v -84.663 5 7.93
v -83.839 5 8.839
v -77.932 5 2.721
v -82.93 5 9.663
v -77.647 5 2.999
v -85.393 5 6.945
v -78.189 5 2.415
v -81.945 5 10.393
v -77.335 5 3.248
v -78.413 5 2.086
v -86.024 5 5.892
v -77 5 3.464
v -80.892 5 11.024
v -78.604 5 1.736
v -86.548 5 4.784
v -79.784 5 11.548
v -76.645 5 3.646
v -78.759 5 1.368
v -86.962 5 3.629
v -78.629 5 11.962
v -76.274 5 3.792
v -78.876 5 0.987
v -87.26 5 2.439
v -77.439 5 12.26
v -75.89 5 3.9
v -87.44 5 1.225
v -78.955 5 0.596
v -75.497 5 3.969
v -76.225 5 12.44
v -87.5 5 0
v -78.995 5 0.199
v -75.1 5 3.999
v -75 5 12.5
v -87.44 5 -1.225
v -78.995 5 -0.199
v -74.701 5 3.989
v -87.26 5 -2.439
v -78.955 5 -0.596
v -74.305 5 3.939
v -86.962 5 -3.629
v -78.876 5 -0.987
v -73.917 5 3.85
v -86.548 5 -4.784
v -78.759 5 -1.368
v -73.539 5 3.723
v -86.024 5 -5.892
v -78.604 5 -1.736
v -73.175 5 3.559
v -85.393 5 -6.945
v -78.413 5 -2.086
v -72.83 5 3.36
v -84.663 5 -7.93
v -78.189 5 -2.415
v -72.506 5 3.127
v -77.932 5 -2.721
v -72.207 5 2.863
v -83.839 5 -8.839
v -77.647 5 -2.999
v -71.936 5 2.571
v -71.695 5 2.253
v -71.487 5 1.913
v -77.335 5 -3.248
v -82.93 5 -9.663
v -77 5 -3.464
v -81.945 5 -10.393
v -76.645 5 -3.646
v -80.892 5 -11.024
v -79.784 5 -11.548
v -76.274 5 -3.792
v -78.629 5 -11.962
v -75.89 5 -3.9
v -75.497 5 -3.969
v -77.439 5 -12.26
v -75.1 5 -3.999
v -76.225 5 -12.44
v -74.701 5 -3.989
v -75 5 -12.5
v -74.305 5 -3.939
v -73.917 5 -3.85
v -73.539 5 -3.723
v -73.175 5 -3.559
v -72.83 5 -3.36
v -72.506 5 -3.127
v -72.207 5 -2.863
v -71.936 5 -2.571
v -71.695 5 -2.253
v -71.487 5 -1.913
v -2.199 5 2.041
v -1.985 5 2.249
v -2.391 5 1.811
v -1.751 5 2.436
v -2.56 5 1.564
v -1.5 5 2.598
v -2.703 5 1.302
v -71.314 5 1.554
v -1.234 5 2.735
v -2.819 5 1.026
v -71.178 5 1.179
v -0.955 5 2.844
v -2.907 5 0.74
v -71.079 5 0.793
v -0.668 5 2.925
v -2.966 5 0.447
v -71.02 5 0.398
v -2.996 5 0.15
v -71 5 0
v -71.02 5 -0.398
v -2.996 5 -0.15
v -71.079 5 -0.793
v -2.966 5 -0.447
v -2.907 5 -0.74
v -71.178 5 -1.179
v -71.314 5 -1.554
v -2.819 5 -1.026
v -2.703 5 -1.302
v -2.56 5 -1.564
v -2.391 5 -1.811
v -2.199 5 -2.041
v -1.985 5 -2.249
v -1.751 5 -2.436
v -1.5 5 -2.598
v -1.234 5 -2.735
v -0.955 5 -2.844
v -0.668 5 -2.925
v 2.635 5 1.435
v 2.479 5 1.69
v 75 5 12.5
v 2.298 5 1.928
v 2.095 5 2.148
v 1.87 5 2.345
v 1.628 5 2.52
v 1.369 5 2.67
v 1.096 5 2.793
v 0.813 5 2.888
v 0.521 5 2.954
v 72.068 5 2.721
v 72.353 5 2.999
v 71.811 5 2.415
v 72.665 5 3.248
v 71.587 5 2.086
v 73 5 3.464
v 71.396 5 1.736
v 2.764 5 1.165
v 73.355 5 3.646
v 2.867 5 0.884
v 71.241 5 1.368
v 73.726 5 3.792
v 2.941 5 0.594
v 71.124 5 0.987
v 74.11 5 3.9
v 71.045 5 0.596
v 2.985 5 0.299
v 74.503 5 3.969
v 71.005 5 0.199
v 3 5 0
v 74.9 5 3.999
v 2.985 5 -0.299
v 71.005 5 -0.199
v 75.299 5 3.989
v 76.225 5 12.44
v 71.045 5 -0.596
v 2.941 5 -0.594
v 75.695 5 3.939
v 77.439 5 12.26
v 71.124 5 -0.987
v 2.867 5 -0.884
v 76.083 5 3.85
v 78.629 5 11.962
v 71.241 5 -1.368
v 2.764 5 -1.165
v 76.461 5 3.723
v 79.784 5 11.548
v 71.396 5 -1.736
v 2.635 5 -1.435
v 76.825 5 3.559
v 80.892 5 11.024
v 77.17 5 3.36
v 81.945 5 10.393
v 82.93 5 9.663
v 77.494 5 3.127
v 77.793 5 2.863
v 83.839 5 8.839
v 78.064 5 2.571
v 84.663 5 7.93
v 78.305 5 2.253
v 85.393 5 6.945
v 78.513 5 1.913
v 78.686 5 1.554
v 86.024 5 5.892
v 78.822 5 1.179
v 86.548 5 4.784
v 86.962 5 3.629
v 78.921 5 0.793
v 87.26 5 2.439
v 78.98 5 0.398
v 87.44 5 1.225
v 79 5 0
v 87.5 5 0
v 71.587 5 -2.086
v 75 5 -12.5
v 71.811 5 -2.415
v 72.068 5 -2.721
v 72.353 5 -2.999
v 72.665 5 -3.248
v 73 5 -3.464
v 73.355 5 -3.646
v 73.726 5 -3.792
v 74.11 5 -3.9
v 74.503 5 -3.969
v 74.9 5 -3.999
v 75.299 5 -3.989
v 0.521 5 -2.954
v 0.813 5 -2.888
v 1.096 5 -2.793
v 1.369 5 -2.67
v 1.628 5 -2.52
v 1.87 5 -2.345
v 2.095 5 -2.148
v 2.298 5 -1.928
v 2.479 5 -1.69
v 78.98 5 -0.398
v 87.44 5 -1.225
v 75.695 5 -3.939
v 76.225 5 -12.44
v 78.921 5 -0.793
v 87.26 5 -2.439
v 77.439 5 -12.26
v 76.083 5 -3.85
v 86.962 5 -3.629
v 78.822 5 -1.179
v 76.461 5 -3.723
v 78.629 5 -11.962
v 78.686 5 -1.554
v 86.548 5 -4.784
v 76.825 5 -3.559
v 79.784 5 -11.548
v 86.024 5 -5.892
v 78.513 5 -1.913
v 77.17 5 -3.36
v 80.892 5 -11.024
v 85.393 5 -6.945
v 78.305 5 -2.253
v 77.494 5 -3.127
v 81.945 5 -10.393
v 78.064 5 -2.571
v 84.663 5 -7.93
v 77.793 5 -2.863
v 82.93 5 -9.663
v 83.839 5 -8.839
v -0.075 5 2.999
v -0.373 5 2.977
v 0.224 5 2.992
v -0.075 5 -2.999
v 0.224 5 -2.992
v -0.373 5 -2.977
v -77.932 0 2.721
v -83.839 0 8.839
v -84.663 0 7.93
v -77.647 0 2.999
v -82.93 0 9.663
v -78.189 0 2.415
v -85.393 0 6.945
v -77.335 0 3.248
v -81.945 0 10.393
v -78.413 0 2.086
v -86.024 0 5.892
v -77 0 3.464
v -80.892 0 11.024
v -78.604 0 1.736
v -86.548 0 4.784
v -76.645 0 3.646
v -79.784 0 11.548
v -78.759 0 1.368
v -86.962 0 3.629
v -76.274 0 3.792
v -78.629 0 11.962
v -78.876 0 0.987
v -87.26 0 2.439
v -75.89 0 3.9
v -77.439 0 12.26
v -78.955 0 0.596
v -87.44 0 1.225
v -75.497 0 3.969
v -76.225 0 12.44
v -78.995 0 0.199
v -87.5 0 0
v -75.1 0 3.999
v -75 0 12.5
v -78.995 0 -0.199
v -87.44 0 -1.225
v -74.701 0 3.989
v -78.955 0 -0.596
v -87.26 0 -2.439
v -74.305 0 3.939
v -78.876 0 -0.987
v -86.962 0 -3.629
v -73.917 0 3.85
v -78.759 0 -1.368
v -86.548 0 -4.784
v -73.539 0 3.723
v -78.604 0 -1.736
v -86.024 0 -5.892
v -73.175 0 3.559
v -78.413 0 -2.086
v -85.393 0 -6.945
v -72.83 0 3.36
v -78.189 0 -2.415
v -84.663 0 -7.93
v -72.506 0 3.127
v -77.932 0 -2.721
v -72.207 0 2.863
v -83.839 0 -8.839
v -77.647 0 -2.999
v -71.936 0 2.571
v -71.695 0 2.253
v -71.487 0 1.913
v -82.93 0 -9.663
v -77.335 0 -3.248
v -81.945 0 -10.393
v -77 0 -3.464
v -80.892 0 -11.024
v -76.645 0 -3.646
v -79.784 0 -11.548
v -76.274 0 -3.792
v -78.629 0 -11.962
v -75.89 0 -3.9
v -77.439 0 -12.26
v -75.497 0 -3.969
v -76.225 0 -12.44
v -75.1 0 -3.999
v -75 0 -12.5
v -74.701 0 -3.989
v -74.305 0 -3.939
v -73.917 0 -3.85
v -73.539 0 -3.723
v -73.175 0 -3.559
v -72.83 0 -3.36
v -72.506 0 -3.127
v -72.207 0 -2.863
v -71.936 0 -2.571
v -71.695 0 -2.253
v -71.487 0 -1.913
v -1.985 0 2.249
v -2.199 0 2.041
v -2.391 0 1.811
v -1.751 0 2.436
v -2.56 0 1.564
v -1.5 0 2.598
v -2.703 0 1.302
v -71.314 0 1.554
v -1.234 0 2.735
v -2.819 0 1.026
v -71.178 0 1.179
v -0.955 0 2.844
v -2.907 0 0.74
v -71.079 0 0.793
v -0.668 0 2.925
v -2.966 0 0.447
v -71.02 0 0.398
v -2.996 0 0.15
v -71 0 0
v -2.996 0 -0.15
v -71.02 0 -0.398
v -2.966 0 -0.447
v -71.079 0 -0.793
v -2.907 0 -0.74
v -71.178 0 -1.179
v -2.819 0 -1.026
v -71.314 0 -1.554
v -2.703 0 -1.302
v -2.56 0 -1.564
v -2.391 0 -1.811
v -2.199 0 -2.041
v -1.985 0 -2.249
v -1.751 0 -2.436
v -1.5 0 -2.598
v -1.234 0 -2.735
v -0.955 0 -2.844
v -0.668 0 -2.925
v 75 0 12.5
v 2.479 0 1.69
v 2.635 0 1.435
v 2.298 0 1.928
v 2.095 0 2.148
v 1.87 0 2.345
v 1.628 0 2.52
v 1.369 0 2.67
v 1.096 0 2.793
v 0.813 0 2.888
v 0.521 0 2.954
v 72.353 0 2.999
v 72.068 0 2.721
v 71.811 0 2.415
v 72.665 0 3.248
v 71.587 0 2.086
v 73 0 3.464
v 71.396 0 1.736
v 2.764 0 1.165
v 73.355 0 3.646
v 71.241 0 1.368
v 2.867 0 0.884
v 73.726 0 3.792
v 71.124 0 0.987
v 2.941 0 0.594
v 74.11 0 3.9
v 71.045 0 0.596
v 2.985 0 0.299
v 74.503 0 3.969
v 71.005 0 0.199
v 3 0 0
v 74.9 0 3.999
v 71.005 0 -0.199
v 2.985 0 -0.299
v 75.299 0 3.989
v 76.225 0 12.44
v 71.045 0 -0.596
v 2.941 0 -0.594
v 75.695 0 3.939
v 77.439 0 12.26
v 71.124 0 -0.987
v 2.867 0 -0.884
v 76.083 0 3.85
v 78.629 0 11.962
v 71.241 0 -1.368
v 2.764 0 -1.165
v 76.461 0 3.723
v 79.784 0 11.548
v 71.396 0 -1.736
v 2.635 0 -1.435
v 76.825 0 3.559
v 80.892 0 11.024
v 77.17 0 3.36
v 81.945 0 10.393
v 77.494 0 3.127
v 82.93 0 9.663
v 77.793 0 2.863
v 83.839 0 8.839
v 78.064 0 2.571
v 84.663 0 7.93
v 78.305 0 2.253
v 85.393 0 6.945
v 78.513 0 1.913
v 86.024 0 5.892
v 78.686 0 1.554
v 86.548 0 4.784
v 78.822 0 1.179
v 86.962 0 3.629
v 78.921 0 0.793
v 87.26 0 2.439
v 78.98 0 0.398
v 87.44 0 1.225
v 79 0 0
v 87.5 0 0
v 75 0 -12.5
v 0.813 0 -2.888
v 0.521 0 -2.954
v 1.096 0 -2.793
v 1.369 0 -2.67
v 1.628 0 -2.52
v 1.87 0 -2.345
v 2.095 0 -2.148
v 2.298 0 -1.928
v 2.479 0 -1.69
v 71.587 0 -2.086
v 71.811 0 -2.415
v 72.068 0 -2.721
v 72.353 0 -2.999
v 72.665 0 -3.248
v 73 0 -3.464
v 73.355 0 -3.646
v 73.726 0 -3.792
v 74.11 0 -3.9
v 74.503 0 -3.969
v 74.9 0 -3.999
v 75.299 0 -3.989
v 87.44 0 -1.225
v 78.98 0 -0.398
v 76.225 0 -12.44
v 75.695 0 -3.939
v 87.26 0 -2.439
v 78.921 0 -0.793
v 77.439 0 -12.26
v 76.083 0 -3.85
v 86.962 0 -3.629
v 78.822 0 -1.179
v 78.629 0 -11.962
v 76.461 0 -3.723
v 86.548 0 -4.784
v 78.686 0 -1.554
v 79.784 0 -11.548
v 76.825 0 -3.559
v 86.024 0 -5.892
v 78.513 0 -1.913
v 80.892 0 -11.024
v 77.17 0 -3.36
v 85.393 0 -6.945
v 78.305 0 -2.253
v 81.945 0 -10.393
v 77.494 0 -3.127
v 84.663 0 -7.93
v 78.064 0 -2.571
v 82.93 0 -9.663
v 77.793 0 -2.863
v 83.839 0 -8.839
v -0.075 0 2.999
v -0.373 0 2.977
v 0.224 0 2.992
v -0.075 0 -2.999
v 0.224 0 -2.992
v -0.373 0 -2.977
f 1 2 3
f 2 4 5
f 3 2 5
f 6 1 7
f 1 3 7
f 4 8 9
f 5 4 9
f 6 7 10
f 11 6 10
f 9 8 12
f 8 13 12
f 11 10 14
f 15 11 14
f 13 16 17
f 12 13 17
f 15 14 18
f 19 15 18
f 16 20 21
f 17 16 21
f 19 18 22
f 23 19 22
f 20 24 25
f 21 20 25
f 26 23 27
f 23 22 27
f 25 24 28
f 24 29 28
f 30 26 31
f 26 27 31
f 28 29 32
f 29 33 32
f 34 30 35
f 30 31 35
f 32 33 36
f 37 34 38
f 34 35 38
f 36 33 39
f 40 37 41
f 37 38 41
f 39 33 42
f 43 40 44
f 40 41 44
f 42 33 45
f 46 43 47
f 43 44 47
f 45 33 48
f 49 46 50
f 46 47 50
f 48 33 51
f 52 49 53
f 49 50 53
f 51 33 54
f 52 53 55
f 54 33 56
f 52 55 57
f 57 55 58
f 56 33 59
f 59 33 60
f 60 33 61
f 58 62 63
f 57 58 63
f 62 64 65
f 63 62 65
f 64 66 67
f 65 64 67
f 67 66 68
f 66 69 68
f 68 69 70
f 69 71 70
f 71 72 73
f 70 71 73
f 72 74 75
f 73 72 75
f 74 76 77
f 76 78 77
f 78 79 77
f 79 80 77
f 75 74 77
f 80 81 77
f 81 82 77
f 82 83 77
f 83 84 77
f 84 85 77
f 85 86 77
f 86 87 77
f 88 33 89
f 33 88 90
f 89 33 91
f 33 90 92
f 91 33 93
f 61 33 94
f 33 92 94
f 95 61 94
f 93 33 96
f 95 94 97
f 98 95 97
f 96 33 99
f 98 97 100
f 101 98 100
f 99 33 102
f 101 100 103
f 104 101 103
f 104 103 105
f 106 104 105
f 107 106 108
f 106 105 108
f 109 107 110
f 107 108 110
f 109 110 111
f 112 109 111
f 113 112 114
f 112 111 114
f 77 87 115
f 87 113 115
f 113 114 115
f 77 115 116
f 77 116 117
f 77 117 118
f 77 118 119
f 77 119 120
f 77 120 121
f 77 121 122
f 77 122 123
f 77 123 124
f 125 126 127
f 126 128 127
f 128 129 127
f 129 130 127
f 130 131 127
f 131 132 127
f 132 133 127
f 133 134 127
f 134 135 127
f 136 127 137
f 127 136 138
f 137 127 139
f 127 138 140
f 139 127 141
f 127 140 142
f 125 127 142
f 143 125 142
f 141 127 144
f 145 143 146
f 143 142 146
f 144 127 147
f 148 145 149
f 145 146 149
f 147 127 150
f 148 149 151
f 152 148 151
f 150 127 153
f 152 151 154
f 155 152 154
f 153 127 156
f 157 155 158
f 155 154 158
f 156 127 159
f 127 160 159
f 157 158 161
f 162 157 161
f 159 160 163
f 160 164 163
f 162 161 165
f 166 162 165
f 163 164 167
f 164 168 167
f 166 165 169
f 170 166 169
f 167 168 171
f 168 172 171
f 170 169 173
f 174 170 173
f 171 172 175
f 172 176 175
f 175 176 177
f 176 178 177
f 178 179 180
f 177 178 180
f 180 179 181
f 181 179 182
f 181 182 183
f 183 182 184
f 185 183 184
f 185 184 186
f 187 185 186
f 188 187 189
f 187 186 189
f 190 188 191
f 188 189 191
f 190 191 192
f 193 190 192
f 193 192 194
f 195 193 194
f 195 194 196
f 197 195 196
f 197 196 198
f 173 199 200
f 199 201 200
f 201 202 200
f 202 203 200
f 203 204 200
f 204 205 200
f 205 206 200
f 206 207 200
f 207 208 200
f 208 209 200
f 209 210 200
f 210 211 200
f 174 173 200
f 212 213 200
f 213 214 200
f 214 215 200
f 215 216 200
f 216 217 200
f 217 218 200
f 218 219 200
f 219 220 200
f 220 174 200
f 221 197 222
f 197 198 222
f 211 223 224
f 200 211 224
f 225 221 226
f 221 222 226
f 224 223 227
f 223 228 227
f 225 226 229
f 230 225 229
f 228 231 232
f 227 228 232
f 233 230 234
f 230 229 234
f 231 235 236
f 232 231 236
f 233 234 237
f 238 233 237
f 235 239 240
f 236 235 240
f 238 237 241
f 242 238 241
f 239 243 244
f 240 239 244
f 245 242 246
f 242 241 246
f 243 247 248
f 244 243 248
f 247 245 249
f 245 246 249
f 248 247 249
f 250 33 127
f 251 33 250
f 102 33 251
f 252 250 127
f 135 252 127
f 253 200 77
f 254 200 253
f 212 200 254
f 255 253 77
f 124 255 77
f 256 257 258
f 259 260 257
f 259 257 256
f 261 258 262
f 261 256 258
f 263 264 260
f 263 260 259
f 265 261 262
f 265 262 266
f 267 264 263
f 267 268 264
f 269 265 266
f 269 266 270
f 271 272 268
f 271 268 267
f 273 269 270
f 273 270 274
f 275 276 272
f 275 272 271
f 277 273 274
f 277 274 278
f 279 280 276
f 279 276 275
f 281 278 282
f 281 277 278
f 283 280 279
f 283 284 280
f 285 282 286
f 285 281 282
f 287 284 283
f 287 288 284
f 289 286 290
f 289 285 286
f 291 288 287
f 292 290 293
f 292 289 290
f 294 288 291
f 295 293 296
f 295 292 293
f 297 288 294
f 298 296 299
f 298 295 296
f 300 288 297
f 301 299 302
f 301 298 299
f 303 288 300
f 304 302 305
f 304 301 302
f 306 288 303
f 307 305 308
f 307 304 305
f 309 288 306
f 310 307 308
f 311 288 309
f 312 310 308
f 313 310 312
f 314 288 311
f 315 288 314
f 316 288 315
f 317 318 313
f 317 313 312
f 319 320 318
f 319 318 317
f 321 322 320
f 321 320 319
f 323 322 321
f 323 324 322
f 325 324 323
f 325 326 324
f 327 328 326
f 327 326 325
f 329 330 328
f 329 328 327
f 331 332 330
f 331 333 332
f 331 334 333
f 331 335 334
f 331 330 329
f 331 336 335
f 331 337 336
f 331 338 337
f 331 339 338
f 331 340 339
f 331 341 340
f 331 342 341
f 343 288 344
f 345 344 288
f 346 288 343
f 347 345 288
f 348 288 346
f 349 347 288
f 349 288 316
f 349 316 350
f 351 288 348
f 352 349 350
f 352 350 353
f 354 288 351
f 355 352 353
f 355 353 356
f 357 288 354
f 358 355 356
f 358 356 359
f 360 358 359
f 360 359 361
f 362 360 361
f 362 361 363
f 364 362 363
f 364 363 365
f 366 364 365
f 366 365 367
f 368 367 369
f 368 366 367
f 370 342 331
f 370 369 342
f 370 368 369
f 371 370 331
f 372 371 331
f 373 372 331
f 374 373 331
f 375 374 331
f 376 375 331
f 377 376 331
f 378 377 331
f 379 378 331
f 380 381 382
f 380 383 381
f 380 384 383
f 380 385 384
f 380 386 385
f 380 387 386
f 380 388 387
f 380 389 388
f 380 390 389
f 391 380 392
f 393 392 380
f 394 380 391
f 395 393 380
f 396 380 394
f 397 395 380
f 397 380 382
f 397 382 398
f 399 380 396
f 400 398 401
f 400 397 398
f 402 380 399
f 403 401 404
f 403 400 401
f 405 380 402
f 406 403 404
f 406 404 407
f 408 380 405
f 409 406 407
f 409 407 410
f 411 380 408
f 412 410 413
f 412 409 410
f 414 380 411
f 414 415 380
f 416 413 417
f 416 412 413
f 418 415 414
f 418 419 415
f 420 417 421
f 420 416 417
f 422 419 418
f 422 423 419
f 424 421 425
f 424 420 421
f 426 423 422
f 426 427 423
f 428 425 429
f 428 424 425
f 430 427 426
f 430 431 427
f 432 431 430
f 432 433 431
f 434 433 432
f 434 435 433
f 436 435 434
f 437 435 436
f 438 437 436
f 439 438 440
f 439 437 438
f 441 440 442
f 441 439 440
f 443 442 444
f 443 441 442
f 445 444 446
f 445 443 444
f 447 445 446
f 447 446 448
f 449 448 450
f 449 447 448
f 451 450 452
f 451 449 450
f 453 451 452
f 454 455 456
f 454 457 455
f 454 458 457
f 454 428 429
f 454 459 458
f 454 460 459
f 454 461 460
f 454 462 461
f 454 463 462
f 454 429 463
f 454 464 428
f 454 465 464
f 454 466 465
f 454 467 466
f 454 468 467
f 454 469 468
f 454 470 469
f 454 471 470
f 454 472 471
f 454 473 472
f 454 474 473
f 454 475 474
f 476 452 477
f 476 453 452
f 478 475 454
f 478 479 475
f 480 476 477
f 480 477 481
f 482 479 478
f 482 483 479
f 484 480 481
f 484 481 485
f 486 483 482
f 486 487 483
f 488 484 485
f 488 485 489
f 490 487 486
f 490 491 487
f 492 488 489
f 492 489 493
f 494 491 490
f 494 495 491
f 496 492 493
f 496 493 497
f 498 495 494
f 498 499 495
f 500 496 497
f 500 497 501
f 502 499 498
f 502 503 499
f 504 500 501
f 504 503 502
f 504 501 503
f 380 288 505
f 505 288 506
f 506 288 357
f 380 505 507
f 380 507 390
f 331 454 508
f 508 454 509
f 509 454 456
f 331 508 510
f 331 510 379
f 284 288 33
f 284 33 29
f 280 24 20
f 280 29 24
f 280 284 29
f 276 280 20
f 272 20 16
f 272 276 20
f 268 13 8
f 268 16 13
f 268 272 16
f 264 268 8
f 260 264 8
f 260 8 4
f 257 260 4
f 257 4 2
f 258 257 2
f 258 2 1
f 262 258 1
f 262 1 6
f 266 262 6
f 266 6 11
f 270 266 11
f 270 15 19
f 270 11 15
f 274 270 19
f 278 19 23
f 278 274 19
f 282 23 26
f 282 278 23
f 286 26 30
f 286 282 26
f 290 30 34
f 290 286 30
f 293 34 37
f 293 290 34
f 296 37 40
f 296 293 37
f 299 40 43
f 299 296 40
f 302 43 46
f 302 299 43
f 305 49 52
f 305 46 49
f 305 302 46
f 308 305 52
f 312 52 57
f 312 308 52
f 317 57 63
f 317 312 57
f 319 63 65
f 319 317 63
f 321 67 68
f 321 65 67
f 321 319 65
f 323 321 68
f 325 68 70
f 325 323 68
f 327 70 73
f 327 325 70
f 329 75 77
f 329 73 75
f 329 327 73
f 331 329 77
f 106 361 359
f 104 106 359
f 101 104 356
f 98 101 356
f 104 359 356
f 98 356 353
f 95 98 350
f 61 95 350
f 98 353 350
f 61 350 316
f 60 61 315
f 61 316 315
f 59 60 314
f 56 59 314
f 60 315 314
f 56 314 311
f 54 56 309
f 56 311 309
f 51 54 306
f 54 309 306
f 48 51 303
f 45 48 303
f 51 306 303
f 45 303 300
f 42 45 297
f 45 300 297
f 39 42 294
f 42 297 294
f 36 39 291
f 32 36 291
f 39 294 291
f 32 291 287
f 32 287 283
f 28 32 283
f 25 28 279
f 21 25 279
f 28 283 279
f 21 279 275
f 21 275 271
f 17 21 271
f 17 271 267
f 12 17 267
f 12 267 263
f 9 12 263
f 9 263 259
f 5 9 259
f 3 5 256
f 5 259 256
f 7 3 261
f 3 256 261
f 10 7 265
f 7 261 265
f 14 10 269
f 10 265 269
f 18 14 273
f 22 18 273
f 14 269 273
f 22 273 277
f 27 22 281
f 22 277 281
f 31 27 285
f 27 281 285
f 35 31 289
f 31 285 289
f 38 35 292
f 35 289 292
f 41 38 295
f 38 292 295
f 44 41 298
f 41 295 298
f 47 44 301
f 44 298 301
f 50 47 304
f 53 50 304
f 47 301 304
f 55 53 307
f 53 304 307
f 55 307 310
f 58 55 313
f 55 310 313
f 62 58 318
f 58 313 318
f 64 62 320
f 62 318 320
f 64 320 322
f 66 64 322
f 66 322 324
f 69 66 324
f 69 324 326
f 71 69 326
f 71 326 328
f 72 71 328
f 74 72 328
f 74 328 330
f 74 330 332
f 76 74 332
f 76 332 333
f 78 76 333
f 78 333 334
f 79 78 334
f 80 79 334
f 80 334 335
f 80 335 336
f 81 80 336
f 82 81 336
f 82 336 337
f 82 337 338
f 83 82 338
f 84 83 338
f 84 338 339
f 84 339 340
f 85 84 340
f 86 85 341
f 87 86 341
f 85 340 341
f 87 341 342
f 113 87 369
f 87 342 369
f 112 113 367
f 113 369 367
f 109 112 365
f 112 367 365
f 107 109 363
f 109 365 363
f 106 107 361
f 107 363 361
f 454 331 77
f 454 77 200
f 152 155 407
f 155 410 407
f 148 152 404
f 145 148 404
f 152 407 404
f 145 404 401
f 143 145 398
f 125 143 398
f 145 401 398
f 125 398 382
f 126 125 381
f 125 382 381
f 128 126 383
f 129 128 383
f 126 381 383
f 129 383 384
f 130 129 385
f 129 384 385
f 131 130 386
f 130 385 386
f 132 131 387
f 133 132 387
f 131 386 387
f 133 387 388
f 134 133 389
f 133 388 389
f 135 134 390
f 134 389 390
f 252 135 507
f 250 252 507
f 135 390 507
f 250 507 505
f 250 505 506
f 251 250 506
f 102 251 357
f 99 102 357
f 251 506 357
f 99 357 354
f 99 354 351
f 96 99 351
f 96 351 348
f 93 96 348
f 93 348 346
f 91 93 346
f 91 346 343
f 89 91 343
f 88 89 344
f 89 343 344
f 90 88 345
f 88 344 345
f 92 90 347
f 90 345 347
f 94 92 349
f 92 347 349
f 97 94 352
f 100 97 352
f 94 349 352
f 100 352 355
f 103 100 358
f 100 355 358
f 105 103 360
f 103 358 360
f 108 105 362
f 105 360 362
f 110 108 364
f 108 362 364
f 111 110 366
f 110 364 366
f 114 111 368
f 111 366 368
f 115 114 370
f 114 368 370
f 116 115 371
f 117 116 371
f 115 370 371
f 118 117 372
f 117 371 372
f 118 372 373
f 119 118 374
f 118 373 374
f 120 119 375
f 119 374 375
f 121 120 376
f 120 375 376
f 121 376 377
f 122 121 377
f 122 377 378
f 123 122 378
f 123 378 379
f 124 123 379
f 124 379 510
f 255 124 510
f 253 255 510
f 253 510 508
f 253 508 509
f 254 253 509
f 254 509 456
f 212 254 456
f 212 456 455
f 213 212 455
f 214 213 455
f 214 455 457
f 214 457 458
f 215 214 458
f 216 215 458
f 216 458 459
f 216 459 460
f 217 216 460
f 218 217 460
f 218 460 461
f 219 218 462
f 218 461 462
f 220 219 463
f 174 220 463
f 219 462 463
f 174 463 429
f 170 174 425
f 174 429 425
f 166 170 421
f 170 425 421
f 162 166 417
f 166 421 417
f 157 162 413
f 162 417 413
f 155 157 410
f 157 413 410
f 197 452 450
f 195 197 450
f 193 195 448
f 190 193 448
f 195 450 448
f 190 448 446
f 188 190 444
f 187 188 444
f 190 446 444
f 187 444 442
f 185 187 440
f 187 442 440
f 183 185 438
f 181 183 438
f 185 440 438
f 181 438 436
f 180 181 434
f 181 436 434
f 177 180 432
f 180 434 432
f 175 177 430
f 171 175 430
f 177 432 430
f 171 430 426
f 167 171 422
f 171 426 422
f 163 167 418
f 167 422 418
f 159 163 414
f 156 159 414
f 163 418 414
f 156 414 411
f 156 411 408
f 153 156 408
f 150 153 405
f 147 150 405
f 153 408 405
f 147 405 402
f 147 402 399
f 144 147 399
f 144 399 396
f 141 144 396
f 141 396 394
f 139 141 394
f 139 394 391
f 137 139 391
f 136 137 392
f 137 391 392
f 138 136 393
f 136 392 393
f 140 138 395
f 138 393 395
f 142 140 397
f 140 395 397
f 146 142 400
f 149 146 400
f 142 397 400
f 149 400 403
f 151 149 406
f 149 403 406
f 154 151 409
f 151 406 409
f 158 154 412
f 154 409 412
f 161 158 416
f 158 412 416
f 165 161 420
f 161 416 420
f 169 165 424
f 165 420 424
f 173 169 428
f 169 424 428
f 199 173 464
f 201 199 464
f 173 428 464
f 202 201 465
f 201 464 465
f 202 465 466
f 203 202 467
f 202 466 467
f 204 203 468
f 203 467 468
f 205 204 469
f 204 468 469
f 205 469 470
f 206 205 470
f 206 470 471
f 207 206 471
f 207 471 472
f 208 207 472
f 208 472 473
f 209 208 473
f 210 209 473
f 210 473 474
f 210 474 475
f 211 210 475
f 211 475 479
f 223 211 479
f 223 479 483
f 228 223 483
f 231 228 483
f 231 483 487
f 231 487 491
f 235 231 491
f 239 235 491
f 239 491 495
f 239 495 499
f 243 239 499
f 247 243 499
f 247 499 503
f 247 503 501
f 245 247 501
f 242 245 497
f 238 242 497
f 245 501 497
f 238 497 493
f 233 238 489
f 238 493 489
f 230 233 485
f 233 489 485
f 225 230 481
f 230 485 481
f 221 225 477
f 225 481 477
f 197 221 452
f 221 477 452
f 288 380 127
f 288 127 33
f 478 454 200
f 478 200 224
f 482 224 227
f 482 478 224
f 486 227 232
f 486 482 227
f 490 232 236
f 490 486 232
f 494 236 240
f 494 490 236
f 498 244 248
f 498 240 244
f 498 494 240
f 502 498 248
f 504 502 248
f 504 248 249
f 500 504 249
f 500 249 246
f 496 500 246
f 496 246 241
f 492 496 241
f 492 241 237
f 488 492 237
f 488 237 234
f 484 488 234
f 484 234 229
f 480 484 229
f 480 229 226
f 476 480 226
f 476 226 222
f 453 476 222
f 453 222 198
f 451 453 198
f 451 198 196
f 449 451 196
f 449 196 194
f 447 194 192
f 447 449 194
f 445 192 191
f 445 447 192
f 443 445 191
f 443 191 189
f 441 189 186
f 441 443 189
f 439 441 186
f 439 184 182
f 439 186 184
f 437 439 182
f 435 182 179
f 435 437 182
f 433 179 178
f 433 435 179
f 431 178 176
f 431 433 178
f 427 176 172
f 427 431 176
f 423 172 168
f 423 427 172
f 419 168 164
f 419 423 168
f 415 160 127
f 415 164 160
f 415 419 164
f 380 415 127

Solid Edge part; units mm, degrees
sketch "Sketch1" plane through (0, 0, 0) normal (0, -1, 0) x (1, 0, 0)
  line L0 (75, 12.5) -> (-75, 12.5)
  line L1 (-75, -12.5) -> (75, -12.5)
  arc A0 (-75, -12.5) -> (-75, 12.5) centre (-75, 0) cw
  arc A1 (75, 12.5) -> (75, -12.5) centre (75, 0) cw
  circle A2 centre (-75, 0) radius 4
  circle A3 centre (75, 0) radius 4
  circle A4 centre (0, 0) radius 3
extrude "ExtrudedProtrusion_2" add sketch "Sketch1" against normal blind 5
properties material "Polycarbonate( 20-40% Glass Fiber)"
